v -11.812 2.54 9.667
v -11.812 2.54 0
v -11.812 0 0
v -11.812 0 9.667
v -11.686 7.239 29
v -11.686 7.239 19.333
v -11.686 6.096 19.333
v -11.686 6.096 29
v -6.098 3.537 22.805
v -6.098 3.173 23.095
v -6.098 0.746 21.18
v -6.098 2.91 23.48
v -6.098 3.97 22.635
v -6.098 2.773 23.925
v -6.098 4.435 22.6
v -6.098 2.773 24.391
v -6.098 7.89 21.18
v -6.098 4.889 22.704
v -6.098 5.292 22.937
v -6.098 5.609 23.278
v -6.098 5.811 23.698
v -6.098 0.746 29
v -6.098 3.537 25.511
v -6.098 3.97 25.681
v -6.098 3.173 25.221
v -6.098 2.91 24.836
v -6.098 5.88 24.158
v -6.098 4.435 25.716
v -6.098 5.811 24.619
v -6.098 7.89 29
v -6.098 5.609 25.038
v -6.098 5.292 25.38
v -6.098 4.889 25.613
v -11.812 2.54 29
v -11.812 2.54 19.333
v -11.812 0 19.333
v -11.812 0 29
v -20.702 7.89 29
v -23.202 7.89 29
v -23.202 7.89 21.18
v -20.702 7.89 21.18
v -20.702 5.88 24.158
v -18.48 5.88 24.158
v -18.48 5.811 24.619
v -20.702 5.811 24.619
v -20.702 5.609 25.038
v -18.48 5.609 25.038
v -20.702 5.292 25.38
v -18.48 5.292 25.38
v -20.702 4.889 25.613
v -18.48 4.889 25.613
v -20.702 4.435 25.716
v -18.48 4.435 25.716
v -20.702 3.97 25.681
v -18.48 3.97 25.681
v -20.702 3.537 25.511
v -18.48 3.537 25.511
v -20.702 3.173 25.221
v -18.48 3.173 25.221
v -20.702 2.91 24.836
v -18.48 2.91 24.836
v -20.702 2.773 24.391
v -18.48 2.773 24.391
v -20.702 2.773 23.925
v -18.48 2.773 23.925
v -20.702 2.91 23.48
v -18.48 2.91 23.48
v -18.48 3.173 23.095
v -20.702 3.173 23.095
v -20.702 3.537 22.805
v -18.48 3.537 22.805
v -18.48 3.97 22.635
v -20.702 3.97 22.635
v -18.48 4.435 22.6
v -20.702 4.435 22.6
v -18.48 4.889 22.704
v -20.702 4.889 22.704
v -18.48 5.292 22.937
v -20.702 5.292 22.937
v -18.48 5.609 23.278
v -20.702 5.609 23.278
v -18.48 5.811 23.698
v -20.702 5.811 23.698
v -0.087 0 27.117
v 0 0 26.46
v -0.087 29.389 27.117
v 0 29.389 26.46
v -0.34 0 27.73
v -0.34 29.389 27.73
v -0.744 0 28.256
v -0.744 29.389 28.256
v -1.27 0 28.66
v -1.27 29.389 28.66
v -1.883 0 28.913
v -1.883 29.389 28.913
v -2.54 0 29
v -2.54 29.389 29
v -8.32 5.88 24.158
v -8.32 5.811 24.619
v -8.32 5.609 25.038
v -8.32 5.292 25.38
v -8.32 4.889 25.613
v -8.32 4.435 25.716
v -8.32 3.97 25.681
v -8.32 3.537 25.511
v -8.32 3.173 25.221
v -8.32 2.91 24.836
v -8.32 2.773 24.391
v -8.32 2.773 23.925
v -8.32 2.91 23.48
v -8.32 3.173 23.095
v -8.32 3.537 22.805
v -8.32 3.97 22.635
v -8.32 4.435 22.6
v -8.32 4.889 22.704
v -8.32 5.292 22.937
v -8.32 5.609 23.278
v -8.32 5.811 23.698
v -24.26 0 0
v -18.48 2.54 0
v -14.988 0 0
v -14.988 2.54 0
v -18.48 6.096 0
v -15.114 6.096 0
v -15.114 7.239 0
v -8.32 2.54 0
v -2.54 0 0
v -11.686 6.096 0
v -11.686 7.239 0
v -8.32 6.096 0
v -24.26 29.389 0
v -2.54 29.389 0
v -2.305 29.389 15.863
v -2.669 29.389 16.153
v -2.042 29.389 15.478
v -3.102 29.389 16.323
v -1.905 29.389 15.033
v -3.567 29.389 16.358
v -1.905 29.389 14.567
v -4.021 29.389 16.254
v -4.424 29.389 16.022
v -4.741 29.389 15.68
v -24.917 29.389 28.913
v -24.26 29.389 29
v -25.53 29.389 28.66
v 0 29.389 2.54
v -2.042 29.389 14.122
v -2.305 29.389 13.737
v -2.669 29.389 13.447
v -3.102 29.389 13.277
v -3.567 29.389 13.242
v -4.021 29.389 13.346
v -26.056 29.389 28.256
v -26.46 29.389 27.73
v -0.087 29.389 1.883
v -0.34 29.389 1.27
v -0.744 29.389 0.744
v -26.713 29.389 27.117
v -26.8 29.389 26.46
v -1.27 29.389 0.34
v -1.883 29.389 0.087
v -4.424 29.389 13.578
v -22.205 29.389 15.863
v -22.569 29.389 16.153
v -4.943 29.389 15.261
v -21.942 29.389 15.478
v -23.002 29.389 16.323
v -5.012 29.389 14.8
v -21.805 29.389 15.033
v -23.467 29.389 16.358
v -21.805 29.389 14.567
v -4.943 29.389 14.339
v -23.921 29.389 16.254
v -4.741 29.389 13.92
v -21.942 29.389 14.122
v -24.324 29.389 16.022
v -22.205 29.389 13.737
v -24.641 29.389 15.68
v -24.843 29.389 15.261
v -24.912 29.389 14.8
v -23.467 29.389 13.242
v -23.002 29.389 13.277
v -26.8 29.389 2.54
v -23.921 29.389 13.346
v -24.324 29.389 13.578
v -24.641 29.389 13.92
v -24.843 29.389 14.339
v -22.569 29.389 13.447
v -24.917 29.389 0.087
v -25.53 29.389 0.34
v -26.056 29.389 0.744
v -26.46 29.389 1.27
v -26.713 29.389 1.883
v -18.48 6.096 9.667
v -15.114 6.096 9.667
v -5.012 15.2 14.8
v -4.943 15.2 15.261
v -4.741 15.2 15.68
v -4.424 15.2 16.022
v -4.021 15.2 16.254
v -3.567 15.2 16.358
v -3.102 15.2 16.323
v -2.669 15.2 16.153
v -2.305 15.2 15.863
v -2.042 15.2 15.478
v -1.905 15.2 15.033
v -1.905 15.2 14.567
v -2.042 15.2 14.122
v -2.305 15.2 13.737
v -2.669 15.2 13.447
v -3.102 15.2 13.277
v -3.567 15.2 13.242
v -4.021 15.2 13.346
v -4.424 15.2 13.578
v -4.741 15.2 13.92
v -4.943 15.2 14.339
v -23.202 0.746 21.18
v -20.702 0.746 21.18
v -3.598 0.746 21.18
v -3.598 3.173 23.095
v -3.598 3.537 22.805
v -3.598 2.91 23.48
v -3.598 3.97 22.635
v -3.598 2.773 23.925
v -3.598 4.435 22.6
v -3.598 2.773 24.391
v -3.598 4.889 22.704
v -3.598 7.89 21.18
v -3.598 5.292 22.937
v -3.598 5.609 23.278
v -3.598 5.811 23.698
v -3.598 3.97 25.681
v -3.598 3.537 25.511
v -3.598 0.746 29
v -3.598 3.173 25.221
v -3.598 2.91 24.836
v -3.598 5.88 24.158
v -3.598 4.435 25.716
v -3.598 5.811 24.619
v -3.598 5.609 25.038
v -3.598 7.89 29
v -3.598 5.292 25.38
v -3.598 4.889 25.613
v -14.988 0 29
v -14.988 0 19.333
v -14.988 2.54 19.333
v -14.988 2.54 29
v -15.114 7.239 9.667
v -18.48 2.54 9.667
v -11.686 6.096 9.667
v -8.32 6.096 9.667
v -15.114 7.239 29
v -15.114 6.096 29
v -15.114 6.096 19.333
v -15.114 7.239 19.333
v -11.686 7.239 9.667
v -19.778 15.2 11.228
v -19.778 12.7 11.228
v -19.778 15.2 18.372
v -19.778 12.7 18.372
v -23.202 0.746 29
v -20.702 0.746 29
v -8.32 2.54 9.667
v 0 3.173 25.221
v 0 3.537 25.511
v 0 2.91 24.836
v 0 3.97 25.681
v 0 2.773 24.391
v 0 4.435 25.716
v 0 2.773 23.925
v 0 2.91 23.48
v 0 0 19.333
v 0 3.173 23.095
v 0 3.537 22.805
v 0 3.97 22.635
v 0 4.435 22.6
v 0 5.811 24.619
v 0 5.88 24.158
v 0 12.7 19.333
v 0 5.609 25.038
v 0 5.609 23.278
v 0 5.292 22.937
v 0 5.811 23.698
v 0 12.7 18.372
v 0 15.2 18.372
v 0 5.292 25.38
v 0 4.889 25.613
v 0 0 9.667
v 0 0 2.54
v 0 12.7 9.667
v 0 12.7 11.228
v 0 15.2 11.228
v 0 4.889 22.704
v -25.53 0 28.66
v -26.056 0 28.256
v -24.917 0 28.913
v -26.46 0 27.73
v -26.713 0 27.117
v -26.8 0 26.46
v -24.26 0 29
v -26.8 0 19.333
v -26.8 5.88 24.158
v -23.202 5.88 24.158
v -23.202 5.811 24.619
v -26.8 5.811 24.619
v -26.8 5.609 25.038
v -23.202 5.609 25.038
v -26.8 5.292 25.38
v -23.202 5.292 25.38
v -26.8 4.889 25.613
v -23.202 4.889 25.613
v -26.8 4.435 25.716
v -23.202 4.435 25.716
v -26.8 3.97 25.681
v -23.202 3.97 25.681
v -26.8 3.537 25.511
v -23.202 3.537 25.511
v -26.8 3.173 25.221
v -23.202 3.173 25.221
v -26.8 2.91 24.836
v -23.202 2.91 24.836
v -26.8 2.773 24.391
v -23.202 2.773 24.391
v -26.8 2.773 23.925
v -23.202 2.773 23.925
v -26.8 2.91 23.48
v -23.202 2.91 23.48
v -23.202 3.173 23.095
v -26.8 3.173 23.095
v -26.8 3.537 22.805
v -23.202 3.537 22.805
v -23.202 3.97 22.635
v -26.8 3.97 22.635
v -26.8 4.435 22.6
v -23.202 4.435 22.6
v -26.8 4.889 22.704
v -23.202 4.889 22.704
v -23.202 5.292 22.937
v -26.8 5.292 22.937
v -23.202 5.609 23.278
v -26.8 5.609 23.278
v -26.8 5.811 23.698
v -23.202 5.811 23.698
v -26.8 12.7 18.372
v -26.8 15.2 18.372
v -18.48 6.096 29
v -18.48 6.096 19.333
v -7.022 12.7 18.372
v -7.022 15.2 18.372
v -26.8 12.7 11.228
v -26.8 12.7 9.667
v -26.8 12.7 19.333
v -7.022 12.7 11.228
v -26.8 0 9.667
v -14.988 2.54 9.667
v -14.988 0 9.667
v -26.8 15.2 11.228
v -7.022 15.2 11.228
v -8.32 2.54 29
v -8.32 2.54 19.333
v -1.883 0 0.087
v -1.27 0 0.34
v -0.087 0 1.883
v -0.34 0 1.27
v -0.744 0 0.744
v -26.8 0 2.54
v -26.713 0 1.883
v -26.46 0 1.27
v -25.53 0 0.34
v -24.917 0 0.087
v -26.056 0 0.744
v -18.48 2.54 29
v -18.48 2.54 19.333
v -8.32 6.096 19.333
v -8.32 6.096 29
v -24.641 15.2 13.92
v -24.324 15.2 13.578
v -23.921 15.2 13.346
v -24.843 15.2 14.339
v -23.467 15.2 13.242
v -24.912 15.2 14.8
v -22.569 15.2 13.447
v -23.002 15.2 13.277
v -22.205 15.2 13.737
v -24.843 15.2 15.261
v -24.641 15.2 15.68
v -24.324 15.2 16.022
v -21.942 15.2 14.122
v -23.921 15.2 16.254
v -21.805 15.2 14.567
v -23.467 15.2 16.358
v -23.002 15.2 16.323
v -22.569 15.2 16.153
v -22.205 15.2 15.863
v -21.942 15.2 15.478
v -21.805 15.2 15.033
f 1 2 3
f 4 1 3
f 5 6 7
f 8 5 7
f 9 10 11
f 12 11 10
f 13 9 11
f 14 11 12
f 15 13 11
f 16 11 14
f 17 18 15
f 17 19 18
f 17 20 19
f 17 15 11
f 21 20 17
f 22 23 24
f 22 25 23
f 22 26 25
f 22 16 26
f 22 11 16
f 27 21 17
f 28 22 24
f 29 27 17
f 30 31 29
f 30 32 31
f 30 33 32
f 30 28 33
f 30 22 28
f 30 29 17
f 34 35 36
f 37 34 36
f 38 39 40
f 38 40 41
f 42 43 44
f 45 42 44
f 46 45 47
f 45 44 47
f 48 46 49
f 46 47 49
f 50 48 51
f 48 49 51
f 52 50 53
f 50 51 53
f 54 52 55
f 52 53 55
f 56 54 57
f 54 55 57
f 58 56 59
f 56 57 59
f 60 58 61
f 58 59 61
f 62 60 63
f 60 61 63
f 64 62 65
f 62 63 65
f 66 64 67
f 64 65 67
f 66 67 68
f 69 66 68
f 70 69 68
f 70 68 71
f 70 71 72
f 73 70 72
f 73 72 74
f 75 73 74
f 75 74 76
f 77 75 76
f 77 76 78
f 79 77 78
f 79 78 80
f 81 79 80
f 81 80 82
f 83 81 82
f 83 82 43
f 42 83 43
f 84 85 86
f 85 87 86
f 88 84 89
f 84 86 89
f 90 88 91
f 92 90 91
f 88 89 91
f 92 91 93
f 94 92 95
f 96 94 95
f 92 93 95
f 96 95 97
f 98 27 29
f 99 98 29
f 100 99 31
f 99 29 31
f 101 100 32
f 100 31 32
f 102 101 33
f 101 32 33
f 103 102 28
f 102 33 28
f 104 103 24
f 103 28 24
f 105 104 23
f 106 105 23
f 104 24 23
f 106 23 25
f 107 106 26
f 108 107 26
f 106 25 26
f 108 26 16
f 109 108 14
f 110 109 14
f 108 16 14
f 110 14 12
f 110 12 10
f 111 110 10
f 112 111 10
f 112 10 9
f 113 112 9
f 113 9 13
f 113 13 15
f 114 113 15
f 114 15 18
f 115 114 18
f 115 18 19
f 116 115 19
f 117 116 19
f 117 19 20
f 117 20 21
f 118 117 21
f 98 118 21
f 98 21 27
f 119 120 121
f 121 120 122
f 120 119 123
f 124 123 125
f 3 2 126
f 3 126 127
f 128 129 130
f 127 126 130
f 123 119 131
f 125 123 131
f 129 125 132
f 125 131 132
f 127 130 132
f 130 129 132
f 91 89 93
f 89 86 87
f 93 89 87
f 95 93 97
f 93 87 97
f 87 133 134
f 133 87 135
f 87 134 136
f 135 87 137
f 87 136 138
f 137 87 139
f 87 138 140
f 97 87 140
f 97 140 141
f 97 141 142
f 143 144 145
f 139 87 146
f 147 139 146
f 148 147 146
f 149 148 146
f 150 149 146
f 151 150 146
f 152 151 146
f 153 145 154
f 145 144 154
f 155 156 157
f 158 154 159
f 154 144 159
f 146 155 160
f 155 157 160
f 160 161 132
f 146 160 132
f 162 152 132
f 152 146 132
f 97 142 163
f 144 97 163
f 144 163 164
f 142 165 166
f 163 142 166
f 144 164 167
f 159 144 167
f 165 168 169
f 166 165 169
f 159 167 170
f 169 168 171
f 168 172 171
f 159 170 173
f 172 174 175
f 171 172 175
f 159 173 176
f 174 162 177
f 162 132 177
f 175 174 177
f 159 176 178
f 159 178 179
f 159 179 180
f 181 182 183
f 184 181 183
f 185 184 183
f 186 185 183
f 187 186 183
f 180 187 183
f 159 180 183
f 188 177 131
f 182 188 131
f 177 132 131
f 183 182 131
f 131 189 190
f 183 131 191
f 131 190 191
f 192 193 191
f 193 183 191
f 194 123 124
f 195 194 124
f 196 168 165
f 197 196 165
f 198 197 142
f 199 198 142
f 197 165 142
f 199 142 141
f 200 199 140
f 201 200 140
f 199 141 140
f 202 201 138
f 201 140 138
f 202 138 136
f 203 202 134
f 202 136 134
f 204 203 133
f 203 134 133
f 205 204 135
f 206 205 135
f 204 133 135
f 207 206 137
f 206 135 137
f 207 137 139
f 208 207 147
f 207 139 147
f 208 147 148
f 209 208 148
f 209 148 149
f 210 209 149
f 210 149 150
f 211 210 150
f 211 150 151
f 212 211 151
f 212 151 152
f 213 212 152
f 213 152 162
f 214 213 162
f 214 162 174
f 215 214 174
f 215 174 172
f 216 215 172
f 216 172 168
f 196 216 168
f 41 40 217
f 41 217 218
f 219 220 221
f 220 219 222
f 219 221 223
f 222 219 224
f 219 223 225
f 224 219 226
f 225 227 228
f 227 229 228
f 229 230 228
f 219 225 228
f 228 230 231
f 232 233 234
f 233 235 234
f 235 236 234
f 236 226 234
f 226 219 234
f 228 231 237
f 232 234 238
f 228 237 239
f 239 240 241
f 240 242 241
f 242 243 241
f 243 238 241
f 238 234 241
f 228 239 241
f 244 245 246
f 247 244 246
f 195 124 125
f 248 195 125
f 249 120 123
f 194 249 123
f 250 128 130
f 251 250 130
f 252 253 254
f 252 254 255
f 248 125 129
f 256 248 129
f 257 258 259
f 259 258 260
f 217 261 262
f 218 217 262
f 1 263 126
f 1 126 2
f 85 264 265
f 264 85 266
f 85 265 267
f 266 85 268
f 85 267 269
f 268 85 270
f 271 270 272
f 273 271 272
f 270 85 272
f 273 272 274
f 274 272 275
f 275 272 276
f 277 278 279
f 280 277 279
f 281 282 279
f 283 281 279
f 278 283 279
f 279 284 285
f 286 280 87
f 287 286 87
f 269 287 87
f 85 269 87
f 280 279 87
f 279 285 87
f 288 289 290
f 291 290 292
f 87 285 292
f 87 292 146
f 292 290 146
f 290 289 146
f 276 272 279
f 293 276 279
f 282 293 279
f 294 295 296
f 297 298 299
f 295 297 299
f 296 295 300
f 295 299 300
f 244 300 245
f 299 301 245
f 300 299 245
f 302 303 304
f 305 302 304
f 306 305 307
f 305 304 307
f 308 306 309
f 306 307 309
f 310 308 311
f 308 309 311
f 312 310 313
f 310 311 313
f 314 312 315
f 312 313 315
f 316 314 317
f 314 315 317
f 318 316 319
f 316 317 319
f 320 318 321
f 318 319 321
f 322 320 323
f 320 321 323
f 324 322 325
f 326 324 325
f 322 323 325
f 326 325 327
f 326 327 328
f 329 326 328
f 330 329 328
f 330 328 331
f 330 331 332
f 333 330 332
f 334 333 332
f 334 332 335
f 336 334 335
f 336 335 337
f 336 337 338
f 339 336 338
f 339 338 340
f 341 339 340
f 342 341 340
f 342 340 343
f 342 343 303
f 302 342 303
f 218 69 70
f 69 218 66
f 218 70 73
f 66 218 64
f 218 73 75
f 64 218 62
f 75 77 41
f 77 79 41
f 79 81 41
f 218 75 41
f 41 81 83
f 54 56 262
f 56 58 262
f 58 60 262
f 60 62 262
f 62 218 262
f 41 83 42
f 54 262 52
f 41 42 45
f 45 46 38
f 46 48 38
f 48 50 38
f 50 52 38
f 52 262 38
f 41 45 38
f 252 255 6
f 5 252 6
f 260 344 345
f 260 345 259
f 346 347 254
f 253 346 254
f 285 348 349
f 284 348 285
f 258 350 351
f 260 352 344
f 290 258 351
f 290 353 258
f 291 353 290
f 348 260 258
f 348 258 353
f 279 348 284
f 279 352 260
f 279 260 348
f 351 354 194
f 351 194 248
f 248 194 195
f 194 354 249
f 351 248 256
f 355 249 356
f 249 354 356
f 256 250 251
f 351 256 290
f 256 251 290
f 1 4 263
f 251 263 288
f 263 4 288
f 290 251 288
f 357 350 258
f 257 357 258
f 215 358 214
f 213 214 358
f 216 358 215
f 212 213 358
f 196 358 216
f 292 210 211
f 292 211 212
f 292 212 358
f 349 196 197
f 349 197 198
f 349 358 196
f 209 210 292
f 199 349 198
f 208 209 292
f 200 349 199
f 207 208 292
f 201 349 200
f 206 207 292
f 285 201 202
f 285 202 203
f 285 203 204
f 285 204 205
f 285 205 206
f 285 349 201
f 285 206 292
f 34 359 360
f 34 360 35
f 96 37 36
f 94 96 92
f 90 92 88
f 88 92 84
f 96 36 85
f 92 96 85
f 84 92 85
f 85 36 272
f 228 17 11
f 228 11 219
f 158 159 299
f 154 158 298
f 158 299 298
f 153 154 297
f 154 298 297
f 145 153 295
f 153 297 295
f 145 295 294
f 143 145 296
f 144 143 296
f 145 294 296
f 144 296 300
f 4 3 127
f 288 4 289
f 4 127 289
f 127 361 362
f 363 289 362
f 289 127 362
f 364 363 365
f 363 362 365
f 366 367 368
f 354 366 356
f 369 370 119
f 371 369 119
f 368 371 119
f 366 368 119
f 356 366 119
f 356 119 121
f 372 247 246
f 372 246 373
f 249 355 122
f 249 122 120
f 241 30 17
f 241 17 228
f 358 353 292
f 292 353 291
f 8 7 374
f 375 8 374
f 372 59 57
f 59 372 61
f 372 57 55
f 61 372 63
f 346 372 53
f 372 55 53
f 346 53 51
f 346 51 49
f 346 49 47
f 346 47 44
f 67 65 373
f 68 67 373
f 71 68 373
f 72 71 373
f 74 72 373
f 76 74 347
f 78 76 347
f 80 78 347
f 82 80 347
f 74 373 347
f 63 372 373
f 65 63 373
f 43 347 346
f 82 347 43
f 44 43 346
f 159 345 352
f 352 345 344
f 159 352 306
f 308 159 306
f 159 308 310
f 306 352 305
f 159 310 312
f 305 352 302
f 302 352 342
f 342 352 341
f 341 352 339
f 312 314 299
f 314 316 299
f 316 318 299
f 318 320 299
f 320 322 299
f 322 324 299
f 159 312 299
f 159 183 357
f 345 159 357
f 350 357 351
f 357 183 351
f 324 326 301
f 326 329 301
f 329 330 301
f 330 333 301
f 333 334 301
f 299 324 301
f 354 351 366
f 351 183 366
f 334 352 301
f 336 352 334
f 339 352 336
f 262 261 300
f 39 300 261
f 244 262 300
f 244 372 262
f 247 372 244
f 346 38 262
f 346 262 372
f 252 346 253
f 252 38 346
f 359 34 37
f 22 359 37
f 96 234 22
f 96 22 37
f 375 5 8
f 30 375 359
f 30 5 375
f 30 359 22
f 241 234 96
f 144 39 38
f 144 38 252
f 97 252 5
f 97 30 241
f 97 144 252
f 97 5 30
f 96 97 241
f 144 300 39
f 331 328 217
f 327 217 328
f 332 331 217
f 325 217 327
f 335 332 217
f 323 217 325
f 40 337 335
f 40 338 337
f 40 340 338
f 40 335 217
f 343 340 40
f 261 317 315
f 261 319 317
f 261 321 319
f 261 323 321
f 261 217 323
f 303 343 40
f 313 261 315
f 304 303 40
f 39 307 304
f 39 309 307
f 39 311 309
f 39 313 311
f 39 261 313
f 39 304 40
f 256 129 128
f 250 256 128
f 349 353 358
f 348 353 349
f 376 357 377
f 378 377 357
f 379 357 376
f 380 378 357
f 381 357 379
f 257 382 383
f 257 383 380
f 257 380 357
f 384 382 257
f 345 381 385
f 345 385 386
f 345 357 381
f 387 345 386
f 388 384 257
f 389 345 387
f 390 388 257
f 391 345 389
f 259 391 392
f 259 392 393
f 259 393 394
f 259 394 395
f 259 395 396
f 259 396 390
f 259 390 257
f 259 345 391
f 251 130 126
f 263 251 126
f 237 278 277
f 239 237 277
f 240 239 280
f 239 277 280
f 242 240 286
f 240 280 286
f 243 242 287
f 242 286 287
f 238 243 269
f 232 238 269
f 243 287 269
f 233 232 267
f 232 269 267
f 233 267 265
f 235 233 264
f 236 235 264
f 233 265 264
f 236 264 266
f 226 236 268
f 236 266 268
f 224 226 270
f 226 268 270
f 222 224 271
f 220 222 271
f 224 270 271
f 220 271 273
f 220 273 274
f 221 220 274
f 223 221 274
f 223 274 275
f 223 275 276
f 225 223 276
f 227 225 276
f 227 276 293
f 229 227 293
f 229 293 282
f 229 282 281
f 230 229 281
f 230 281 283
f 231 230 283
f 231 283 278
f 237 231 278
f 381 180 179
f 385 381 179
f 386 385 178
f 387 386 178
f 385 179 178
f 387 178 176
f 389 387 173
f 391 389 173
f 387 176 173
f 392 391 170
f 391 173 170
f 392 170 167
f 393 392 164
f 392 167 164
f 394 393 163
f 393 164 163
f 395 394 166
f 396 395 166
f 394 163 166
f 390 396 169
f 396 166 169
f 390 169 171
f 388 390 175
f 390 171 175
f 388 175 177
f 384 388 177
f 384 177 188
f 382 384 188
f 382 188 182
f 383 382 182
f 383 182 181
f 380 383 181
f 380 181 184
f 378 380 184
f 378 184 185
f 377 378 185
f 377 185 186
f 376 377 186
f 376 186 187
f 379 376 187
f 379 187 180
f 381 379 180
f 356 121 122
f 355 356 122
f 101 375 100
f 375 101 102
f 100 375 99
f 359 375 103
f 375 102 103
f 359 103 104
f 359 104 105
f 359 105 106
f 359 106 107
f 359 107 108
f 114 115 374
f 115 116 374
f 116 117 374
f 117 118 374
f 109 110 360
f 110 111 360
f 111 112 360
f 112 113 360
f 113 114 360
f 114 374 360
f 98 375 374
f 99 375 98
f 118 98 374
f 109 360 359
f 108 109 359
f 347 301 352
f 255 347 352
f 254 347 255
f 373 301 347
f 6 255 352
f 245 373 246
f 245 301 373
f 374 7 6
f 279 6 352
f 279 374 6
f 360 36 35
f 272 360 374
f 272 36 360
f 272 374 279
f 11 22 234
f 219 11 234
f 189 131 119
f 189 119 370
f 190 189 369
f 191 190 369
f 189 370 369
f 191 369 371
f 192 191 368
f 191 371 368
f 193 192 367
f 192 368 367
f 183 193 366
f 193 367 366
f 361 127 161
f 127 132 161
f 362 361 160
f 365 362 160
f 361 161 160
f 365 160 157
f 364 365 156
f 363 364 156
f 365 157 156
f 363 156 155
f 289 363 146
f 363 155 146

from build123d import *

# Parameters (mm, degrees)
F1_DEPTH  = 29
F2_W      = 26.8
F2_H      = 9.666666
F3_DEPTH  = 12.7
F4_R      = 2.54
F5_R      = 1.5625
F6_DEPTH  = 16.689
F7_W      = 7.14375
F7_H      = 7.14375
F8_DEPTH  = 2.5
F11_R     = 1.5625
F12_DEPTH = 26.801
F15_W     = 2.5
F15_H     = 7.14375
F16_DEPTH = 7.82


with BuildPart() as f1:
    # F0 (on Top) → F1 (new body)
    with BuildSketch(Plane.XY):
        Polygon((-11.8125, 0), (0, 0), (0, 29.389), (-26.8, 29.389), (-26.8, 0), (-14.9875, 0), (-14.9875, 2.54), (-18.48, 2.54), (-18.48, 6.096), (-15.1145, 6.096), (-15.1145, 7.239), (-11.6855, 7.239), (-11.6855, 6.096), (-8.32, 6.096), (-8.32, 2.54), (-11.8125, 2.54), align=None)
    extrude(amount=F1_DEPTH)

    # F2 (on face) → F3 (cut)
    with BuildSketch(Plane.XZ):
        with Locations((-13.4, 14.5)):
            Rectangle(F2_W, F2_H)
    extrude(amount=-F3_DEPTH, mode=Mode.SUBTRACT)

    # F4
    f4_edges = [f1.edges().sort_by_distance(p)[0] for p in [
        (0, 14.6945, 29),
        (-26.8, 14.6945, 29),
        (-26.8, 14.6945, 0),
        (0, 14.6945, 0),
    ]]
    fillet(f4_edges, radius=F4_R)

    # F5 (on face) → F6 (cut, through all)
    with BuildSketch(Plane(origin=(0, 29.389, 0), x_dir=(-1, 0, 0), z_dir=(0, 1, 0))):
        with Locations((3.45, 14.8)):
            Circle(F5_R)
        with Locations((23.35, 14.8)):
            Circle(F5_R)
    extrude(amount=-F6_DEPTH, mode=Mode.SUBTRACT)

    # F7 (on face) → F8 (cut)
    with BuildSketch(Plane.XZ.offset(-12.7)):
        with Locations((-23.35, 14.8)):
            Rectangle(F7_W, F7_H)
        with Locations((-3.45, 14.8)):
            Rectangle(F7_W, F7_H)
    extrude(amount=-F8_DEPTH, mode=Mode.SUBTRACT)

    # F11 (on face) → F12 (cut, through all)
    with BuildSketch(Plane.YZ):
        with Locations((4.318, 24.158125)):
            Circle(F11_R)
    extrude(amount=-F12_DEPTH, mode=Mode.SUBTRACT)

    # F15 (on face) → F16 (cut)
    with BuildSketch(Plane.XY.offset(29)):
        with Locations((-4.8475, 4.318)):
            Rectangle(F15_W, F15_H)
        with Locations((-21.9525, 4.318)):
            Rectangle(F15_W, F15_H)
    extrude(amount=-F16_DEPTH, mode=Mode.SUBTRACT)


solid = f1.part
